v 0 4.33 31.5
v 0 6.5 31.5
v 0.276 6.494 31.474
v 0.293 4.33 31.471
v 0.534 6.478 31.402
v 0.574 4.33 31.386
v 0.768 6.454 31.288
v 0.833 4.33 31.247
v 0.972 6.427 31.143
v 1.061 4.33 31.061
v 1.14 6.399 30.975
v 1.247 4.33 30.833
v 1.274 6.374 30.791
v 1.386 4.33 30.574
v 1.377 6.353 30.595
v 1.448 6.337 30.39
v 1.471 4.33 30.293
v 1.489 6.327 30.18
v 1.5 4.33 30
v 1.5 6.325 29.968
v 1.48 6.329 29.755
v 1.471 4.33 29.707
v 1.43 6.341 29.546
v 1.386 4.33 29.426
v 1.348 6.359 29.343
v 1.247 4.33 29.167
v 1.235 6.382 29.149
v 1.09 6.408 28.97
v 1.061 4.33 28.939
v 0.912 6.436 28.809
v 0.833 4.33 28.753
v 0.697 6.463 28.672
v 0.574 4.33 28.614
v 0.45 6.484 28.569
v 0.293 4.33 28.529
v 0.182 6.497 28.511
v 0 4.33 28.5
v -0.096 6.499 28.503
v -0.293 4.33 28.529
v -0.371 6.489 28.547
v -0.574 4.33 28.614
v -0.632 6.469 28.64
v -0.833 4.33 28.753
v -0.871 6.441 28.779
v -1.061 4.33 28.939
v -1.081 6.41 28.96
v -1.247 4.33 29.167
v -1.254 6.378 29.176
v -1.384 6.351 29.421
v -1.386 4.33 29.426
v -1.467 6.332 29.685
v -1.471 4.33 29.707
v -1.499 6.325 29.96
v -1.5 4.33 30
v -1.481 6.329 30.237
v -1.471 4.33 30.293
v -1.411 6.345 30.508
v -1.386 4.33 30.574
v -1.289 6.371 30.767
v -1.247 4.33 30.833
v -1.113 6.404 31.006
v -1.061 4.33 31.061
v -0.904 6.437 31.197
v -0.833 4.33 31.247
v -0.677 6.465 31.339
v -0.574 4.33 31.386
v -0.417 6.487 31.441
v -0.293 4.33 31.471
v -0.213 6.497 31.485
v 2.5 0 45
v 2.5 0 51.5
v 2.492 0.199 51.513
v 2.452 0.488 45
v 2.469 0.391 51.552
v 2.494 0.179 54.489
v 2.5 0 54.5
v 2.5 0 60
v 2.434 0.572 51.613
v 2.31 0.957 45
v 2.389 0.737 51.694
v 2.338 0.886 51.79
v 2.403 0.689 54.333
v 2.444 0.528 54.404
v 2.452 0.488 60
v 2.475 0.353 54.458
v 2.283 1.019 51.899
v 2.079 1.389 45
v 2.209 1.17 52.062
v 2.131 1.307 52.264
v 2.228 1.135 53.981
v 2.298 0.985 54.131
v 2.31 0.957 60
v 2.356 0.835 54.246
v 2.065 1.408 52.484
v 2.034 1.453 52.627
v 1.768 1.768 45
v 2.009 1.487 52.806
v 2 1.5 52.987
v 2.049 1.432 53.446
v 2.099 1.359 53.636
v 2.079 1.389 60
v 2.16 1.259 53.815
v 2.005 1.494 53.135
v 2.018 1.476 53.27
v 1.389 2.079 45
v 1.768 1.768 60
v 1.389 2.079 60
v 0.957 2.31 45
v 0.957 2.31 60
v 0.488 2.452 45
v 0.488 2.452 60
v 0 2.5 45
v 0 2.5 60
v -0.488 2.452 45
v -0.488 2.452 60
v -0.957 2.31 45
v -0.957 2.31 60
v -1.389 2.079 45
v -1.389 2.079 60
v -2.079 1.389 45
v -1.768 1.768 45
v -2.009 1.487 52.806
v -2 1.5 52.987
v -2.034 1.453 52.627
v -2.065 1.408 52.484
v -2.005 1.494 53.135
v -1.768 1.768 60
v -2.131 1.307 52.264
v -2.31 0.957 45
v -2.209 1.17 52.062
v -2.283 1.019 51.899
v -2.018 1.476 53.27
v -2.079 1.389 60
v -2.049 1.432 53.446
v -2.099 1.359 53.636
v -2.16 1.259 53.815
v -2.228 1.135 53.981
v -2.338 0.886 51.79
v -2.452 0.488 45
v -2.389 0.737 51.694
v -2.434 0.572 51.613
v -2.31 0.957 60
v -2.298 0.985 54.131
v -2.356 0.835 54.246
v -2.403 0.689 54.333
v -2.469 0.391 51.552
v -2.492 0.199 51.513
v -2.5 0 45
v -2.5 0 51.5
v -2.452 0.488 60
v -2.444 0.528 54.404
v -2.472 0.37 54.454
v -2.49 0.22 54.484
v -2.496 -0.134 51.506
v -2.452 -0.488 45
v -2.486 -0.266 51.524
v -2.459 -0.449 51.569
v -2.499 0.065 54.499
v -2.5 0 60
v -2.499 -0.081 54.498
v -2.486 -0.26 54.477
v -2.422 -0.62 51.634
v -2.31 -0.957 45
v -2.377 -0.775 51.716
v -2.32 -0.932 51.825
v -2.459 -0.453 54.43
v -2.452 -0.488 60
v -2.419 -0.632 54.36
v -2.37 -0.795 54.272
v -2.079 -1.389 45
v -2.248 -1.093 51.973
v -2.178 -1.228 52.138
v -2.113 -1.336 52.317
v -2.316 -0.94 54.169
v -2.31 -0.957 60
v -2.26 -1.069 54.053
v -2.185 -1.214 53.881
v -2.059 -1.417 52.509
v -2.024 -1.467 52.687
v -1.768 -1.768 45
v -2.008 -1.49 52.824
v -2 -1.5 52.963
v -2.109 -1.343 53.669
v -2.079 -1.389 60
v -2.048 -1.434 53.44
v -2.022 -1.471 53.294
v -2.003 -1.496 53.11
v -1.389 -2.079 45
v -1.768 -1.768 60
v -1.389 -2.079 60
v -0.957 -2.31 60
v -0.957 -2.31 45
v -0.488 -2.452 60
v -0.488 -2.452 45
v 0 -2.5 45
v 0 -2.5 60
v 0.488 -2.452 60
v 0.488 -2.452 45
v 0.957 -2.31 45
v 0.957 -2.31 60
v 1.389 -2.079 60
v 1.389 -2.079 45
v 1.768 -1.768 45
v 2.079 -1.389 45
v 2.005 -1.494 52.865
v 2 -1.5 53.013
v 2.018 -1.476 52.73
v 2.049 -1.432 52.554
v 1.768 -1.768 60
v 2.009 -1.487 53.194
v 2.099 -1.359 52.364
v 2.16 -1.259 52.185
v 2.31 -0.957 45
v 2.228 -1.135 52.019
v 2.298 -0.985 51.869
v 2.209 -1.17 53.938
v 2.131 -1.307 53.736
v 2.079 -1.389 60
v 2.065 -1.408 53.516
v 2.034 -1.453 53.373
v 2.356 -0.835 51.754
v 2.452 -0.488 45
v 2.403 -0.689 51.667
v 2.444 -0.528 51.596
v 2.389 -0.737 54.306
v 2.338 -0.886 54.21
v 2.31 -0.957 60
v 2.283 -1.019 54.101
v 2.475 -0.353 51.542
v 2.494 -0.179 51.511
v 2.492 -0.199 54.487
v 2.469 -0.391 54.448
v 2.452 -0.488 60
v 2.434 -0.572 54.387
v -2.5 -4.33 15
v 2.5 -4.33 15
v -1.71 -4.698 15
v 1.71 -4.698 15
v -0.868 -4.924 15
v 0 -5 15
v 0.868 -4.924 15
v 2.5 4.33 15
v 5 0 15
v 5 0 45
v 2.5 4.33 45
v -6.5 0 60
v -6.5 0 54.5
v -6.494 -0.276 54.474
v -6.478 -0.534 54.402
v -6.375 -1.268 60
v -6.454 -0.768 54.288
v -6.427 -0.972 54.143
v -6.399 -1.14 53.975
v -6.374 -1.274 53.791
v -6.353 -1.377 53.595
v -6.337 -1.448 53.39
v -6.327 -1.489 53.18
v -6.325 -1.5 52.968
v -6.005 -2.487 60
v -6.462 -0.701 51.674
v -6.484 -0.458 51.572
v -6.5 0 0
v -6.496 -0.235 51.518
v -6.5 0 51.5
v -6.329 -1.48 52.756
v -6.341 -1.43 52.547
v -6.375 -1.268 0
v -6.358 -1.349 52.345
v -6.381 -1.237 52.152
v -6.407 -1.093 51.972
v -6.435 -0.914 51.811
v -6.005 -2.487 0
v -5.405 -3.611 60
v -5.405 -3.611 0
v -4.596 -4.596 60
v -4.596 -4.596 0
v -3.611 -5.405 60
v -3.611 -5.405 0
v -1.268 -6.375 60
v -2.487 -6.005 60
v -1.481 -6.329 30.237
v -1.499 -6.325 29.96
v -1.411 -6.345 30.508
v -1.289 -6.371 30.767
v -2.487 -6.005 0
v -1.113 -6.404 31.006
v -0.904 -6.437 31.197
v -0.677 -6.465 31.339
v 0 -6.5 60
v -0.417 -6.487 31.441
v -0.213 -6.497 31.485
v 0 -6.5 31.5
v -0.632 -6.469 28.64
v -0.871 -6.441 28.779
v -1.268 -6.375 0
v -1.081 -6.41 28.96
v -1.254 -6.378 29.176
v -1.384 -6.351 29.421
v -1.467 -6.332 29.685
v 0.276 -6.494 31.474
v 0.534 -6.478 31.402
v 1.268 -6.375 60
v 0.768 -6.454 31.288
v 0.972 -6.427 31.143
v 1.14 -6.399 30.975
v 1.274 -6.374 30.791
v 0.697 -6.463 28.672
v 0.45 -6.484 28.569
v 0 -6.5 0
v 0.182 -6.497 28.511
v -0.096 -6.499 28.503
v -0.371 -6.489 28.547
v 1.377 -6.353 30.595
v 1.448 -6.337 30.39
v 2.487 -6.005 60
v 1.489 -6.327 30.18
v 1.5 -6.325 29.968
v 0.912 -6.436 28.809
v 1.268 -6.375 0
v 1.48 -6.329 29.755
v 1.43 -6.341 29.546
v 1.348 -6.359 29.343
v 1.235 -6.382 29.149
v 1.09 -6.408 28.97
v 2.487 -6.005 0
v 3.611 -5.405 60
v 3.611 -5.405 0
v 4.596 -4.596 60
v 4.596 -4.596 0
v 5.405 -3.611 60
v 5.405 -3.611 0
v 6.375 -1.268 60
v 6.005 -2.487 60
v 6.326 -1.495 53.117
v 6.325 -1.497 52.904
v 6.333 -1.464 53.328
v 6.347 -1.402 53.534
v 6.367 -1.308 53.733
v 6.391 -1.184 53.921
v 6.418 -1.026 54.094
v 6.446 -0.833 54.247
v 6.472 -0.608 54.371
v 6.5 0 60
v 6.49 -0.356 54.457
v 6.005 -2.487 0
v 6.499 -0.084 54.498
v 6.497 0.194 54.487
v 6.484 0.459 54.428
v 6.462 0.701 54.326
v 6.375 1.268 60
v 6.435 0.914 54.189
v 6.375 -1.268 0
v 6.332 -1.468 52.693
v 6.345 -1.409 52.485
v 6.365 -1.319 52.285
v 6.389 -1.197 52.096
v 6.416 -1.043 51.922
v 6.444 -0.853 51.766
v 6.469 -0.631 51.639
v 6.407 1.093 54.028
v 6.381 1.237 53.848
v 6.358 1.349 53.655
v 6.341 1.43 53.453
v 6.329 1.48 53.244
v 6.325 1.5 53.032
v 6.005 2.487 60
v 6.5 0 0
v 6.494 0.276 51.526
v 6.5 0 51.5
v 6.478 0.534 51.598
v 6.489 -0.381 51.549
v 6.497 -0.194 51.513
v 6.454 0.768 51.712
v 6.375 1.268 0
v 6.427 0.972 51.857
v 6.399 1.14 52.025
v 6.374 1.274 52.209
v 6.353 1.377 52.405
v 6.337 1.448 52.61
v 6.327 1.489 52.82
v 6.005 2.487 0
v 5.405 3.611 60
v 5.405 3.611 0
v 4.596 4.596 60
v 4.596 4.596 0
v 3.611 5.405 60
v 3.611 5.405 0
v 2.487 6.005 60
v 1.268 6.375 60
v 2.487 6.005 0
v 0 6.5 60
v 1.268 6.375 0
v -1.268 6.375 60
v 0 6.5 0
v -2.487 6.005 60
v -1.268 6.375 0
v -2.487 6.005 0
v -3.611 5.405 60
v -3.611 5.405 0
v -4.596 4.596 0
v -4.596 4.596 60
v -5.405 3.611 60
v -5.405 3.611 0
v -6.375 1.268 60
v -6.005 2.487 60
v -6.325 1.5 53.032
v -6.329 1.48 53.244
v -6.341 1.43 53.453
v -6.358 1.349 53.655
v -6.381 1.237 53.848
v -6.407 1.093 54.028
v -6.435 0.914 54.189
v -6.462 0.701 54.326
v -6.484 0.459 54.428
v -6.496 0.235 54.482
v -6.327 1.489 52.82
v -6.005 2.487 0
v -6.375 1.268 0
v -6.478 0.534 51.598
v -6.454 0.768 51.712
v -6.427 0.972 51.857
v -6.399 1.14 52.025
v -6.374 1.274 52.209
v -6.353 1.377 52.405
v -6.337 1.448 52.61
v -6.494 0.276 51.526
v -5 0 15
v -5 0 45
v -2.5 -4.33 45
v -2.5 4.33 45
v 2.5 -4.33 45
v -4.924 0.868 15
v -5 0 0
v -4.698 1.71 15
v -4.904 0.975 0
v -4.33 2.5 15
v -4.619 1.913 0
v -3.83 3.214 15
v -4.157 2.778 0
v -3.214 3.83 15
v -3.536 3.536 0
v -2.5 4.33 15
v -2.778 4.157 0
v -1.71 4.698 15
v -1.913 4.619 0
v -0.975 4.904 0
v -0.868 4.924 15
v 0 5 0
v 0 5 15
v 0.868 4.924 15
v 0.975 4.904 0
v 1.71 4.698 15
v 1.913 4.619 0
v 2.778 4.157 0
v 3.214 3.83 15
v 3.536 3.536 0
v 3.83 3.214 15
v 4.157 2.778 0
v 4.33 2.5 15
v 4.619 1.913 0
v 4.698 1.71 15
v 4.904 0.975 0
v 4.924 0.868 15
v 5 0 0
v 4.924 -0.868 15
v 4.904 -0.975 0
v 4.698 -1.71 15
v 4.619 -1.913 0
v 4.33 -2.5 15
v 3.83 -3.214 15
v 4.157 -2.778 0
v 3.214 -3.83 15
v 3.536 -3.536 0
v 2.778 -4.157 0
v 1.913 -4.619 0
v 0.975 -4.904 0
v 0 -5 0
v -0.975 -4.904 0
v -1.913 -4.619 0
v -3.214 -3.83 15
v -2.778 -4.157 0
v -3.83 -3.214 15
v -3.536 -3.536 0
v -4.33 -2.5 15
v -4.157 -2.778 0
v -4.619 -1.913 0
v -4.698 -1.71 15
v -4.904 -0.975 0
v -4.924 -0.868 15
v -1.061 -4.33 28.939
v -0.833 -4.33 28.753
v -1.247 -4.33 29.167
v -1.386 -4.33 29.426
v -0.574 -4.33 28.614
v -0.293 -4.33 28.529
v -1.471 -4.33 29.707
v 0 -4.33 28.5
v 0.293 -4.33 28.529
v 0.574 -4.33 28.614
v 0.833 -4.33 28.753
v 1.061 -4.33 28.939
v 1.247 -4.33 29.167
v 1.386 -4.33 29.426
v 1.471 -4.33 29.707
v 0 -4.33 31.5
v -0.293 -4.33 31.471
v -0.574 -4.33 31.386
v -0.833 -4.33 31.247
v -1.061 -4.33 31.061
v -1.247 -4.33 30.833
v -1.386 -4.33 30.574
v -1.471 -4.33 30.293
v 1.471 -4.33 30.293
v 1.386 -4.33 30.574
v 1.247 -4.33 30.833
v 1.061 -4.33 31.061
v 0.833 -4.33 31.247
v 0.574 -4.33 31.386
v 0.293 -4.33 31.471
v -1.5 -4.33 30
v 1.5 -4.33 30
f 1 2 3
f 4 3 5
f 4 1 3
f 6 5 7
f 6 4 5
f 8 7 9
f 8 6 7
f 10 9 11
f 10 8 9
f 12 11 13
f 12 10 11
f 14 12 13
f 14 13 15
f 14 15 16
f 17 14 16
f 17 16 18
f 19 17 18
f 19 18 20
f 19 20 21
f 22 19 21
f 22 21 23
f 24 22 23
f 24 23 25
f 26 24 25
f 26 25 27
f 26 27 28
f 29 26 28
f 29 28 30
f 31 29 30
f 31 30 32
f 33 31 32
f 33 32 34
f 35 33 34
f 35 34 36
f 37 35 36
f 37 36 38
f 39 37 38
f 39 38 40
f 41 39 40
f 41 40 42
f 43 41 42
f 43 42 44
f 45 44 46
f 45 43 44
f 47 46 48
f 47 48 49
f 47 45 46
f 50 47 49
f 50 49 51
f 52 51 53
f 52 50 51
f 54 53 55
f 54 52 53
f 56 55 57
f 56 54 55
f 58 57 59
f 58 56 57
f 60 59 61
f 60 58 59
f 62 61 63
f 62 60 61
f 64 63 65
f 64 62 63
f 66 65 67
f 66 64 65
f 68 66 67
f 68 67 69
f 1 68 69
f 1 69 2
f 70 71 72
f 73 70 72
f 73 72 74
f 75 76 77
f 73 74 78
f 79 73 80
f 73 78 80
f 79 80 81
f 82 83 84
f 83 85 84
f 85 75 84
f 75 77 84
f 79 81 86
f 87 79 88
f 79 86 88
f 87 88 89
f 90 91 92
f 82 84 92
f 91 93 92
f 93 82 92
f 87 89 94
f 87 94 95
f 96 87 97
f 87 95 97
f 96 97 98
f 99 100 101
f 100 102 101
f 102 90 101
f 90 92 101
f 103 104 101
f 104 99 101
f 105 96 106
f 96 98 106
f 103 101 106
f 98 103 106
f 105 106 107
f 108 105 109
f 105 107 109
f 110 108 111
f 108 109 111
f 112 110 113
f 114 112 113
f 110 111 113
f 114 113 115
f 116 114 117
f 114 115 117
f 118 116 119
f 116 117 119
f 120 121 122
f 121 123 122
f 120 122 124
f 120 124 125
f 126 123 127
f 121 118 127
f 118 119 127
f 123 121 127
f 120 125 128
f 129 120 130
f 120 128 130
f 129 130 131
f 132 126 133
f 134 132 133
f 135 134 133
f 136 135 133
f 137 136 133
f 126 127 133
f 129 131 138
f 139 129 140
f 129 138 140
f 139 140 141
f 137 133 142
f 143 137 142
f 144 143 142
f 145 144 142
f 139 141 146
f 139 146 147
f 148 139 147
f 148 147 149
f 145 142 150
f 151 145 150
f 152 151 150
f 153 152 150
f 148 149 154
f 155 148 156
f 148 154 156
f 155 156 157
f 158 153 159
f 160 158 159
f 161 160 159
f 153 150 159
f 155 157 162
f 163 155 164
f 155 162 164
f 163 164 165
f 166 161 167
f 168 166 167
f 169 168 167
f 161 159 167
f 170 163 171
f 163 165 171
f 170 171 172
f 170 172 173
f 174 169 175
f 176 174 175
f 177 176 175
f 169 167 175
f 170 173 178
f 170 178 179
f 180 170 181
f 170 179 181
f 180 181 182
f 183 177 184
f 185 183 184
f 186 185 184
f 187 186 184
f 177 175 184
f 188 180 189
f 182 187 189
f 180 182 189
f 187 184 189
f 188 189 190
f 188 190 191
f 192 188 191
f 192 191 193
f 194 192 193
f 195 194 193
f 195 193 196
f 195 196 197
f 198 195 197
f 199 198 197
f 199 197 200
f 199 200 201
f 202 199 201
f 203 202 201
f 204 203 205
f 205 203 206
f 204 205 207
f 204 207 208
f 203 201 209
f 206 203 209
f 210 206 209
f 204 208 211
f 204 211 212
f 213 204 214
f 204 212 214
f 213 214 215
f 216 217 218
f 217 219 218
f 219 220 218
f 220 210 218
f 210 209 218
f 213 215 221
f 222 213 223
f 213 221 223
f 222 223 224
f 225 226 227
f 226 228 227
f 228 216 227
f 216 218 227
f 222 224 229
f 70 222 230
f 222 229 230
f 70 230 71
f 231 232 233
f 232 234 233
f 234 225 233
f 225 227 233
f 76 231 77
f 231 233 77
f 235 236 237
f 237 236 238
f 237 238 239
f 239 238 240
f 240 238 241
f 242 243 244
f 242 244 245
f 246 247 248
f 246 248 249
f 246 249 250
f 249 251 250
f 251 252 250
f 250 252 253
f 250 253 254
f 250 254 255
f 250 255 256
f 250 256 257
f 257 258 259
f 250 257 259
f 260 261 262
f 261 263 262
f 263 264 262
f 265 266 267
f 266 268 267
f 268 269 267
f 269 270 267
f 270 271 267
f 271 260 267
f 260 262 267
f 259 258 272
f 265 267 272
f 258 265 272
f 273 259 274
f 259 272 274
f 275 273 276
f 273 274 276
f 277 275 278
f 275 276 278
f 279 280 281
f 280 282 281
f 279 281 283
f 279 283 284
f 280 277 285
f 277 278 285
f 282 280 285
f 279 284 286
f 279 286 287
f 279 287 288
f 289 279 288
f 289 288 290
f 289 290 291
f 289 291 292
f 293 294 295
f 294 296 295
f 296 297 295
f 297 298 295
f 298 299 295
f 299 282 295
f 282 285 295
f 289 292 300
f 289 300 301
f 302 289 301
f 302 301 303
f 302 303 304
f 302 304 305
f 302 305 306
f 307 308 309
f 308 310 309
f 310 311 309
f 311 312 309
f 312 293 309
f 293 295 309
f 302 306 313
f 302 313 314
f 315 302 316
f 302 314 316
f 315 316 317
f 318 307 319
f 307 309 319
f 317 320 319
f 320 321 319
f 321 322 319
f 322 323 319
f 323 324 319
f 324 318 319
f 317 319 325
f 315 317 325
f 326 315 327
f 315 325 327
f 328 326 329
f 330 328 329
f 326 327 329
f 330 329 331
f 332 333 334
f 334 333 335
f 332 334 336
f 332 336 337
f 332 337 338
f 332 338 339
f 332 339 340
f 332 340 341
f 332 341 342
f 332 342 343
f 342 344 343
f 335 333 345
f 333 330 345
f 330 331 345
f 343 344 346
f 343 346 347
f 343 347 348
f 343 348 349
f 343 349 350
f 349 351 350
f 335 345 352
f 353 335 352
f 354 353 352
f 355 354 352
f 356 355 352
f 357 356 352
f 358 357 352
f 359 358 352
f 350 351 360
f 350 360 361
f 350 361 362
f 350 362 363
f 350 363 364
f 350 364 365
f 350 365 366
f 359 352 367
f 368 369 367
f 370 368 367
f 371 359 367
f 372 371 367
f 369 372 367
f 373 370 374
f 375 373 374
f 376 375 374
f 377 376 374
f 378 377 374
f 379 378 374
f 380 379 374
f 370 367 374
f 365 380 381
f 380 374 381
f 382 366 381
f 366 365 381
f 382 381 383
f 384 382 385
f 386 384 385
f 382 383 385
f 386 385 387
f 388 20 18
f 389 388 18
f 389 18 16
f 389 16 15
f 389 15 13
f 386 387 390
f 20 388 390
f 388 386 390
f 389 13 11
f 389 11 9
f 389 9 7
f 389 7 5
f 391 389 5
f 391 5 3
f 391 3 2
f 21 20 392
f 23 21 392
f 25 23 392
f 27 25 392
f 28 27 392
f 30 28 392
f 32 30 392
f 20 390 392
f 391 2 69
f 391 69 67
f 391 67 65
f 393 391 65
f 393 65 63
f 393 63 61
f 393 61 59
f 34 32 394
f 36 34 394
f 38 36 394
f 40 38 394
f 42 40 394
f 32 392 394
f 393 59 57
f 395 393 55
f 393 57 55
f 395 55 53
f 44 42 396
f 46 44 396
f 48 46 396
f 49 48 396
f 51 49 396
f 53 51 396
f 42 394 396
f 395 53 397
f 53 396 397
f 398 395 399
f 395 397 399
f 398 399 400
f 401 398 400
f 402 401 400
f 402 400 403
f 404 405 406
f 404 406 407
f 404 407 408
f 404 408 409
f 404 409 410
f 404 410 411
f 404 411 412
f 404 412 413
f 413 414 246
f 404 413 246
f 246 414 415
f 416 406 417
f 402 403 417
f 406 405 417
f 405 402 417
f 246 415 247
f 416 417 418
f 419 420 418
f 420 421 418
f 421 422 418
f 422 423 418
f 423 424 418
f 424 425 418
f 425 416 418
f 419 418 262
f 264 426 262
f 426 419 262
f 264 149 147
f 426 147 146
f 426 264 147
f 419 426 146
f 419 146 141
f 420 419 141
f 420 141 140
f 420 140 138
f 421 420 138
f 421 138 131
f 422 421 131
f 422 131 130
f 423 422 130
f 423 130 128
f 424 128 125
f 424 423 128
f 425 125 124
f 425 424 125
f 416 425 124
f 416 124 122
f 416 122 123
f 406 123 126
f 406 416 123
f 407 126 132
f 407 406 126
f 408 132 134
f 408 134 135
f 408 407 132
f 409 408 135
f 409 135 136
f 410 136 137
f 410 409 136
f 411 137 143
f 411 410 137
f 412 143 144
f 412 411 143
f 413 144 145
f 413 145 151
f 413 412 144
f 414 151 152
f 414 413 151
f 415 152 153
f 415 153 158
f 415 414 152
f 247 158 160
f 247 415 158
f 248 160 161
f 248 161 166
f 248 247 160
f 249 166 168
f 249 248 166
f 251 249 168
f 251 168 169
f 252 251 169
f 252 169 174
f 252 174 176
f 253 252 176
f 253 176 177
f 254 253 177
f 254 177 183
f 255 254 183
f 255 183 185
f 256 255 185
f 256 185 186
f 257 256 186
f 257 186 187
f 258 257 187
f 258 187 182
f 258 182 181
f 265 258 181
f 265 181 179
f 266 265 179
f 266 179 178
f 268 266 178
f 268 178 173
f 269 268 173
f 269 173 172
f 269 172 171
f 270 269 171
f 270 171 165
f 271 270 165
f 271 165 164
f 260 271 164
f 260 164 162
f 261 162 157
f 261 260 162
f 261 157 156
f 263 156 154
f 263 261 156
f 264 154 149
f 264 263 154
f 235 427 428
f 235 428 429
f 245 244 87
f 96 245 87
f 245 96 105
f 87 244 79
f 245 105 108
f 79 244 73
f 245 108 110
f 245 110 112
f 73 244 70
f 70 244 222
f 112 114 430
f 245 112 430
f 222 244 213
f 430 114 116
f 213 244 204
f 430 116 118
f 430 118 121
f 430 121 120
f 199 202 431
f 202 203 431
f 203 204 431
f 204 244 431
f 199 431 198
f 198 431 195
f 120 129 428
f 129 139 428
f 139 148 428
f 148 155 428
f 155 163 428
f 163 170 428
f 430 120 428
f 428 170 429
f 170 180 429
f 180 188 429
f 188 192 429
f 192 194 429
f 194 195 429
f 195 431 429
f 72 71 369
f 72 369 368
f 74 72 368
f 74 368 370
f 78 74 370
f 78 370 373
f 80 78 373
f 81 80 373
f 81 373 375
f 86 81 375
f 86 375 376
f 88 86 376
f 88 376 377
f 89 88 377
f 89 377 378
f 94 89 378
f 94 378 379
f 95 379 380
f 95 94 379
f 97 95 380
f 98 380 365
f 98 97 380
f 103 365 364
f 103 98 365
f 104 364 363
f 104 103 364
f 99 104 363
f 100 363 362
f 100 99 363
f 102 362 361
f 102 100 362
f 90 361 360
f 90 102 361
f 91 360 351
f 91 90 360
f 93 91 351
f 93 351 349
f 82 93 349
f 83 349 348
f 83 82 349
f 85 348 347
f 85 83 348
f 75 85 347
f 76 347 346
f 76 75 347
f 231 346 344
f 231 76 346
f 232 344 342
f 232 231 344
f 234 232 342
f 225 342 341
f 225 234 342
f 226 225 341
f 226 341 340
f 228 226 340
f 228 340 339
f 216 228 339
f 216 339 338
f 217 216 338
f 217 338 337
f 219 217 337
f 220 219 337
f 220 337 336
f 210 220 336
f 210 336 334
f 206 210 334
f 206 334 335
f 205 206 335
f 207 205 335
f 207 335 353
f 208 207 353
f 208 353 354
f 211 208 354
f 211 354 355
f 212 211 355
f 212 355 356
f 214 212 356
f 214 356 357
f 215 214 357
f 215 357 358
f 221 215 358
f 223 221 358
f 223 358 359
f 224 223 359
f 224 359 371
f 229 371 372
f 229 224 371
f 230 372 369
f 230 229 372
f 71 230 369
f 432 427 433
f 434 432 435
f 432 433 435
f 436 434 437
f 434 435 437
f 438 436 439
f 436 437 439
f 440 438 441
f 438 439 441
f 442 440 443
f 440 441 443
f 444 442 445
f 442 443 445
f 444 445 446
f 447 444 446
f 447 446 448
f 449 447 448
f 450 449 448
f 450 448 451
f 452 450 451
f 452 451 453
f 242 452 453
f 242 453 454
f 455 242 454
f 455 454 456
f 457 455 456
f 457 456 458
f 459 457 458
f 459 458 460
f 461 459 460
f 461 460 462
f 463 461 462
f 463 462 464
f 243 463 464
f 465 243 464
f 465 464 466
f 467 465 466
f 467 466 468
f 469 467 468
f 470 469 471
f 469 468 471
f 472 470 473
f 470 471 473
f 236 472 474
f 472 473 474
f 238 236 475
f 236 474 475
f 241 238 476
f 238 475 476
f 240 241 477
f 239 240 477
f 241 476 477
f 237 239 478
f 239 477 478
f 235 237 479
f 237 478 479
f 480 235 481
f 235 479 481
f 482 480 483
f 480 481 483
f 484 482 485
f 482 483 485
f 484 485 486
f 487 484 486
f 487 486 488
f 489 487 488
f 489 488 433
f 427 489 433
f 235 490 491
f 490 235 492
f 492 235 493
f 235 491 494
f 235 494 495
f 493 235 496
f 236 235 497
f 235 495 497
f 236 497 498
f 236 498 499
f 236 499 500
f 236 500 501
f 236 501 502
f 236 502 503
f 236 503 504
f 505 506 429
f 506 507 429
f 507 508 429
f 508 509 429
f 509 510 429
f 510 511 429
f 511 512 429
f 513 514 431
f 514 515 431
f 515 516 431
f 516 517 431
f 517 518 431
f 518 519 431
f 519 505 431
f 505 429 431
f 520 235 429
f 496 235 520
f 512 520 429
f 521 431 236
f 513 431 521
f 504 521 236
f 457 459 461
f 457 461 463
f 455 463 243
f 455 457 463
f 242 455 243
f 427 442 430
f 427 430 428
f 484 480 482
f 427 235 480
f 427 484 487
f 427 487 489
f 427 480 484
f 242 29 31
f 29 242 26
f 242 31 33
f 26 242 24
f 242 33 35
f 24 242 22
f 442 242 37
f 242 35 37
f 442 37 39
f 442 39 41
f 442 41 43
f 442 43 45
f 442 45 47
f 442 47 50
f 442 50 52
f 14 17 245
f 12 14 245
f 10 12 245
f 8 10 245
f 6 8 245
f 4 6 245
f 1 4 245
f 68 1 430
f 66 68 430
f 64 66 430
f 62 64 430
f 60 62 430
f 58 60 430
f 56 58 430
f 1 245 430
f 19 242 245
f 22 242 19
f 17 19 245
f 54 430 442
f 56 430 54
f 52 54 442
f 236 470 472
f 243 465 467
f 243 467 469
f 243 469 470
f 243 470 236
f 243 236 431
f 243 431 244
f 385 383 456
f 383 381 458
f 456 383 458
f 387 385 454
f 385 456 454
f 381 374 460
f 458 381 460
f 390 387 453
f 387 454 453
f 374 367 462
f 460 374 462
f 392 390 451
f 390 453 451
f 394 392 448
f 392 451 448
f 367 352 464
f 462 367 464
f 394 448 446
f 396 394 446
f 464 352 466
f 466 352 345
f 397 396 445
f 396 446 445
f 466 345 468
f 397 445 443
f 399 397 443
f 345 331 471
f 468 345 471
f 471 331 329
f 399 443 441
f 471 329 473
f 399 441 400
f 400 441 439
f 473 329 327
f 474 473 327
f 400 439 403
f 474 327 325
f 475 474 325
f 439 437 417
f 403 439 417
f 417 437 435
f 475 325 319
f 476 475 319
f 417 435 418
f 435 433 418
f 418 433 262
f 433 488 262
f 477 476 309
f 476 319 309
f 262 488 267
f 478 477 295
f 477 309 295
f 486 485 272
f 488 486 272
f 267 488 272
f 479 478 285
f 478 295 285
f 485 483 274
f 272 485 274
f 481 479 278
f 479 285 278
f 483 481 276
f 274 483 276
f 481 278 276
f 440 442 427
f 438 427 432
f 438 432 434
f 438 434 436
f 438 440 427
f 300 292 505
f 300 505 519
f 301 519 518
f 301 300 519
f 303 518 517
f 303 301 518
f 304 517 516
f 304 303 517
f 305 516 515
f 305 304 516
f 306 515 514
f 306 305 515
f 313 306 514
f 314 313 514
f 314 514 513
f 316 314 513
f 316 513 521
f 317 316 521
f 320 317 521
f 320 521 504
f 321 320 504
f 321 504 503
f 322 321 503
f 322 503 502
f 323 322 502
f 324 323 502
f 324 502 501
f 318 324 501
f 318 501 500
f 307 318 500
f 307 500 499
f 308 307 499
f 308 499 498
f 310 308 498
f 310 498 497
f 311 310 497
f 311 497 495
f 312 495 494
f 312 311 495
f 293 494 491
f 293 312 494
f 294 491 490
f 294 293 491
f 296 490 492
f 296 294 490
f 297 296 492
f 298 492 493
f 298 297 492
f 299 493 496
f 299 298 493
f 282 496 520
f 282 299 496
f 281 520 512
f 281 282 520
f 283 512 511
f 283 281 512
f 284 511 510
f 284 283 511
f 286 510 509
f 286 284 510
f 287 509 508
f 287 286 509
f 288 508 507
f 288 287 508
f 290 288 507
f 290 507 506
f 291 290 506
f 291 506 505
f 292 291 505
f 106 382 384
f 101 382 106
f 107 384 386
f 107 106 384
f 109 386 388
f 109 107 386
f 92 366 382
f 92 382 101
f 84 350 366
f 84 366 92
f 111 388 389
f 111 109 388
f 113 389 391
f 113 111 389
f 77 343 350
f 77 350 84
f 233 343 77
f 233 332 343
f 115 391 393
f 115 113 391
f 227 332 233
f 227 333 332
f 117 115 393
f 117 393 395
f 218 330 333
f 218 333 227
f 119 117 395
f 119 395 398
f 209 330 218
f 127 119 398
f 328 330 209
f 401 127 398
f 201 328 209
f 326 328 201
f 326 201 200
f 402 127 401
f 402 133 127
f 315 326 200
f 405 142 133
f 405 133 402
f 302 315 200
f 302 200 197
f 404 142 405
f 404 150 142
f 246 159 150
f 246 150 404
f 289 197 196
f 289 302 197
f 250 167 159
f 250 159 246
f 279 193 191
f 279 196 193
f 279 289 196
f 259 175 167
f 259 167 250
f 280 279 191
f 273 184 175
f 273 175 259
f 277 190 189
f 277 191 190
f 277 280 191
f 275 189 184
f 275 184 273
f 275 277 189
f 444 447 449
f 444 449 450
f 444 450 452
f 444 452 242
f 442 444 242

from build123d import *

# Parameters (mm, degrees)
CROQUIS1_R                 = 6.5
SALIENTE_EXTRUIR1_DEPTH    = 45
CROQUIS2_R                 = 5
CORTAR_EXTRUIR1_DEPTH      = 15
CORTAR_EXTRUIR2_REACH      = 47.929
CROQUIS4_R                 = 6.5
SALIENTE_EXTRUIR2_DEPTH    = 15
CORTAR_EXTRUIR3_REACH      = 62.7
CROQUIS5_R                 = 2.5
CORTAR_EXTRUIR4_DEPTH      = 61.700082372
CORTAR_EXTRUIR4_DEPTH_BACK = 61.700082372
CROQUIS7_R                 = 1.5
CORTAR_EXTRUIR5_DEPTH      = 61.700082493
CORTAR_EXTRUIR5_DEPTH_BACK = 61.700082493
CROQUIS8_R                 = 1.5


with BuildPart() as part:
    # Croquis1 → Saliente-Extruir1 (new body)
    with BuildSketch(Plane.XY):
        with Locations(Location((0, 0, 0), (0, 0, 180))):
            Circle(CROQUIS1_R)
    extrude(amount=SALIENTE_EXTRUIR1_DEPTH)

    # Croquis2 → Cortar-Extruir1 (cut)
    with BuildSketch(Plane(origin=(0, 0, 0), x_dir=(-1, 0, 0), z_dir=(0, 0, -1))):
        Circle(CROQUIS2_R)
    extrude(amount=-CORTAR_EXTRUIR1_DEPTH, mode=Mode.SUBTRACT)

    # Croquis3 → Cortar-Extruir2 (cut, up to next)
    with BuildSketch(Plane.XY.offset(45), mode=Mode.PRIVATE) as cortar_extruir2_sk1:
        Polygon((-5, 0), (-2.5, -4.330127019), (2.5, -4.330127019), (5, 0), (2.5, 4.330127019), (-2.5, 4.330127019), align=None)
    cortar_extruir2_tool1 = extrude(cortar_extruir2_sk1.sketch, amount=-CORTAR_EXTRUIR2_REACH, mode=Mode.PRIVATE) & part.part
    add(cortar_extruir2_tool1.solids().sort_by_distance((0, 0, 45))[0], mode=Mode.SUBTRACT)

    # Croquis4 → Saliente-Extruir2 (add)
    with BuildSketch(Plane.XY.offset(45)):
        with Locations(Location((0, 0, 0), (0, 0, 180))):
            Circle(CROQUIS4_R)
    extrude(amount=SALIENTE_EXTRUIR2_DEPTH)

    # Croquis5 → Cortar-Extruir3 (cut, up to next)
    with BuildSketch(Plane.XY.offset(60), mode=Mode.PRIVATE) as cortar_extruir3_sk1:
        Circle(CROQUIS5_R)
    cortar_extruir3_tool1 = extrude(cortar_extruir3_sk1.sketch, amount=-CORTAR_EXTRUIR3_REACH, mode=Mode.PRIVATE) & part.part
    add(cortar_extruir3_tool1.solids().sort_by_distance((0, 0, 60))[0], mode=Mode.SUBTRACT)

    # Croquis7 → Cortar-Extruir4 (cut, two sides: drawn at the far end of the back side and taken through both)
    with BuildSketch(Plane(origin=(0, 0, 0), x_dir=(0, 0, -1), z_dir=(1, 0, 0)).offset(-CORTAR_EXTRUIR4_DEPTH_BACK)):
        with Locations((-53, 0)):
            Circle(CROQUIS7_R)
    extrude(amount=CORTAR_EXTRUIR4_DEPTH + CORTAR_EXTRUIR4_DEPTH_BACK, mode=Mode.SUBTRACT)

    # Croquis8 → Cortar-Extruir5 (cut, two sides: drawn at the far end of the back side and taken through both)
    with BuildSketch(Plane(origin=(0, 0, 0), x_dir=(1, 0, 0), z_dir=(0, 1, 0)).offset(-CORTAR_EXTRUIR5_DEPTH_BACK)):
        with Locations(Location((0, -30, 0), (0, 0, 270))):
            Circle(CROQUIS8_R)
    extrude(amount=CORTAR_EXTRUIR5_DEPTH + CORTAR_EXTRUIR5_DEPTH_BACK, mode=Mode.SUBTRACT)


solid = part.part
